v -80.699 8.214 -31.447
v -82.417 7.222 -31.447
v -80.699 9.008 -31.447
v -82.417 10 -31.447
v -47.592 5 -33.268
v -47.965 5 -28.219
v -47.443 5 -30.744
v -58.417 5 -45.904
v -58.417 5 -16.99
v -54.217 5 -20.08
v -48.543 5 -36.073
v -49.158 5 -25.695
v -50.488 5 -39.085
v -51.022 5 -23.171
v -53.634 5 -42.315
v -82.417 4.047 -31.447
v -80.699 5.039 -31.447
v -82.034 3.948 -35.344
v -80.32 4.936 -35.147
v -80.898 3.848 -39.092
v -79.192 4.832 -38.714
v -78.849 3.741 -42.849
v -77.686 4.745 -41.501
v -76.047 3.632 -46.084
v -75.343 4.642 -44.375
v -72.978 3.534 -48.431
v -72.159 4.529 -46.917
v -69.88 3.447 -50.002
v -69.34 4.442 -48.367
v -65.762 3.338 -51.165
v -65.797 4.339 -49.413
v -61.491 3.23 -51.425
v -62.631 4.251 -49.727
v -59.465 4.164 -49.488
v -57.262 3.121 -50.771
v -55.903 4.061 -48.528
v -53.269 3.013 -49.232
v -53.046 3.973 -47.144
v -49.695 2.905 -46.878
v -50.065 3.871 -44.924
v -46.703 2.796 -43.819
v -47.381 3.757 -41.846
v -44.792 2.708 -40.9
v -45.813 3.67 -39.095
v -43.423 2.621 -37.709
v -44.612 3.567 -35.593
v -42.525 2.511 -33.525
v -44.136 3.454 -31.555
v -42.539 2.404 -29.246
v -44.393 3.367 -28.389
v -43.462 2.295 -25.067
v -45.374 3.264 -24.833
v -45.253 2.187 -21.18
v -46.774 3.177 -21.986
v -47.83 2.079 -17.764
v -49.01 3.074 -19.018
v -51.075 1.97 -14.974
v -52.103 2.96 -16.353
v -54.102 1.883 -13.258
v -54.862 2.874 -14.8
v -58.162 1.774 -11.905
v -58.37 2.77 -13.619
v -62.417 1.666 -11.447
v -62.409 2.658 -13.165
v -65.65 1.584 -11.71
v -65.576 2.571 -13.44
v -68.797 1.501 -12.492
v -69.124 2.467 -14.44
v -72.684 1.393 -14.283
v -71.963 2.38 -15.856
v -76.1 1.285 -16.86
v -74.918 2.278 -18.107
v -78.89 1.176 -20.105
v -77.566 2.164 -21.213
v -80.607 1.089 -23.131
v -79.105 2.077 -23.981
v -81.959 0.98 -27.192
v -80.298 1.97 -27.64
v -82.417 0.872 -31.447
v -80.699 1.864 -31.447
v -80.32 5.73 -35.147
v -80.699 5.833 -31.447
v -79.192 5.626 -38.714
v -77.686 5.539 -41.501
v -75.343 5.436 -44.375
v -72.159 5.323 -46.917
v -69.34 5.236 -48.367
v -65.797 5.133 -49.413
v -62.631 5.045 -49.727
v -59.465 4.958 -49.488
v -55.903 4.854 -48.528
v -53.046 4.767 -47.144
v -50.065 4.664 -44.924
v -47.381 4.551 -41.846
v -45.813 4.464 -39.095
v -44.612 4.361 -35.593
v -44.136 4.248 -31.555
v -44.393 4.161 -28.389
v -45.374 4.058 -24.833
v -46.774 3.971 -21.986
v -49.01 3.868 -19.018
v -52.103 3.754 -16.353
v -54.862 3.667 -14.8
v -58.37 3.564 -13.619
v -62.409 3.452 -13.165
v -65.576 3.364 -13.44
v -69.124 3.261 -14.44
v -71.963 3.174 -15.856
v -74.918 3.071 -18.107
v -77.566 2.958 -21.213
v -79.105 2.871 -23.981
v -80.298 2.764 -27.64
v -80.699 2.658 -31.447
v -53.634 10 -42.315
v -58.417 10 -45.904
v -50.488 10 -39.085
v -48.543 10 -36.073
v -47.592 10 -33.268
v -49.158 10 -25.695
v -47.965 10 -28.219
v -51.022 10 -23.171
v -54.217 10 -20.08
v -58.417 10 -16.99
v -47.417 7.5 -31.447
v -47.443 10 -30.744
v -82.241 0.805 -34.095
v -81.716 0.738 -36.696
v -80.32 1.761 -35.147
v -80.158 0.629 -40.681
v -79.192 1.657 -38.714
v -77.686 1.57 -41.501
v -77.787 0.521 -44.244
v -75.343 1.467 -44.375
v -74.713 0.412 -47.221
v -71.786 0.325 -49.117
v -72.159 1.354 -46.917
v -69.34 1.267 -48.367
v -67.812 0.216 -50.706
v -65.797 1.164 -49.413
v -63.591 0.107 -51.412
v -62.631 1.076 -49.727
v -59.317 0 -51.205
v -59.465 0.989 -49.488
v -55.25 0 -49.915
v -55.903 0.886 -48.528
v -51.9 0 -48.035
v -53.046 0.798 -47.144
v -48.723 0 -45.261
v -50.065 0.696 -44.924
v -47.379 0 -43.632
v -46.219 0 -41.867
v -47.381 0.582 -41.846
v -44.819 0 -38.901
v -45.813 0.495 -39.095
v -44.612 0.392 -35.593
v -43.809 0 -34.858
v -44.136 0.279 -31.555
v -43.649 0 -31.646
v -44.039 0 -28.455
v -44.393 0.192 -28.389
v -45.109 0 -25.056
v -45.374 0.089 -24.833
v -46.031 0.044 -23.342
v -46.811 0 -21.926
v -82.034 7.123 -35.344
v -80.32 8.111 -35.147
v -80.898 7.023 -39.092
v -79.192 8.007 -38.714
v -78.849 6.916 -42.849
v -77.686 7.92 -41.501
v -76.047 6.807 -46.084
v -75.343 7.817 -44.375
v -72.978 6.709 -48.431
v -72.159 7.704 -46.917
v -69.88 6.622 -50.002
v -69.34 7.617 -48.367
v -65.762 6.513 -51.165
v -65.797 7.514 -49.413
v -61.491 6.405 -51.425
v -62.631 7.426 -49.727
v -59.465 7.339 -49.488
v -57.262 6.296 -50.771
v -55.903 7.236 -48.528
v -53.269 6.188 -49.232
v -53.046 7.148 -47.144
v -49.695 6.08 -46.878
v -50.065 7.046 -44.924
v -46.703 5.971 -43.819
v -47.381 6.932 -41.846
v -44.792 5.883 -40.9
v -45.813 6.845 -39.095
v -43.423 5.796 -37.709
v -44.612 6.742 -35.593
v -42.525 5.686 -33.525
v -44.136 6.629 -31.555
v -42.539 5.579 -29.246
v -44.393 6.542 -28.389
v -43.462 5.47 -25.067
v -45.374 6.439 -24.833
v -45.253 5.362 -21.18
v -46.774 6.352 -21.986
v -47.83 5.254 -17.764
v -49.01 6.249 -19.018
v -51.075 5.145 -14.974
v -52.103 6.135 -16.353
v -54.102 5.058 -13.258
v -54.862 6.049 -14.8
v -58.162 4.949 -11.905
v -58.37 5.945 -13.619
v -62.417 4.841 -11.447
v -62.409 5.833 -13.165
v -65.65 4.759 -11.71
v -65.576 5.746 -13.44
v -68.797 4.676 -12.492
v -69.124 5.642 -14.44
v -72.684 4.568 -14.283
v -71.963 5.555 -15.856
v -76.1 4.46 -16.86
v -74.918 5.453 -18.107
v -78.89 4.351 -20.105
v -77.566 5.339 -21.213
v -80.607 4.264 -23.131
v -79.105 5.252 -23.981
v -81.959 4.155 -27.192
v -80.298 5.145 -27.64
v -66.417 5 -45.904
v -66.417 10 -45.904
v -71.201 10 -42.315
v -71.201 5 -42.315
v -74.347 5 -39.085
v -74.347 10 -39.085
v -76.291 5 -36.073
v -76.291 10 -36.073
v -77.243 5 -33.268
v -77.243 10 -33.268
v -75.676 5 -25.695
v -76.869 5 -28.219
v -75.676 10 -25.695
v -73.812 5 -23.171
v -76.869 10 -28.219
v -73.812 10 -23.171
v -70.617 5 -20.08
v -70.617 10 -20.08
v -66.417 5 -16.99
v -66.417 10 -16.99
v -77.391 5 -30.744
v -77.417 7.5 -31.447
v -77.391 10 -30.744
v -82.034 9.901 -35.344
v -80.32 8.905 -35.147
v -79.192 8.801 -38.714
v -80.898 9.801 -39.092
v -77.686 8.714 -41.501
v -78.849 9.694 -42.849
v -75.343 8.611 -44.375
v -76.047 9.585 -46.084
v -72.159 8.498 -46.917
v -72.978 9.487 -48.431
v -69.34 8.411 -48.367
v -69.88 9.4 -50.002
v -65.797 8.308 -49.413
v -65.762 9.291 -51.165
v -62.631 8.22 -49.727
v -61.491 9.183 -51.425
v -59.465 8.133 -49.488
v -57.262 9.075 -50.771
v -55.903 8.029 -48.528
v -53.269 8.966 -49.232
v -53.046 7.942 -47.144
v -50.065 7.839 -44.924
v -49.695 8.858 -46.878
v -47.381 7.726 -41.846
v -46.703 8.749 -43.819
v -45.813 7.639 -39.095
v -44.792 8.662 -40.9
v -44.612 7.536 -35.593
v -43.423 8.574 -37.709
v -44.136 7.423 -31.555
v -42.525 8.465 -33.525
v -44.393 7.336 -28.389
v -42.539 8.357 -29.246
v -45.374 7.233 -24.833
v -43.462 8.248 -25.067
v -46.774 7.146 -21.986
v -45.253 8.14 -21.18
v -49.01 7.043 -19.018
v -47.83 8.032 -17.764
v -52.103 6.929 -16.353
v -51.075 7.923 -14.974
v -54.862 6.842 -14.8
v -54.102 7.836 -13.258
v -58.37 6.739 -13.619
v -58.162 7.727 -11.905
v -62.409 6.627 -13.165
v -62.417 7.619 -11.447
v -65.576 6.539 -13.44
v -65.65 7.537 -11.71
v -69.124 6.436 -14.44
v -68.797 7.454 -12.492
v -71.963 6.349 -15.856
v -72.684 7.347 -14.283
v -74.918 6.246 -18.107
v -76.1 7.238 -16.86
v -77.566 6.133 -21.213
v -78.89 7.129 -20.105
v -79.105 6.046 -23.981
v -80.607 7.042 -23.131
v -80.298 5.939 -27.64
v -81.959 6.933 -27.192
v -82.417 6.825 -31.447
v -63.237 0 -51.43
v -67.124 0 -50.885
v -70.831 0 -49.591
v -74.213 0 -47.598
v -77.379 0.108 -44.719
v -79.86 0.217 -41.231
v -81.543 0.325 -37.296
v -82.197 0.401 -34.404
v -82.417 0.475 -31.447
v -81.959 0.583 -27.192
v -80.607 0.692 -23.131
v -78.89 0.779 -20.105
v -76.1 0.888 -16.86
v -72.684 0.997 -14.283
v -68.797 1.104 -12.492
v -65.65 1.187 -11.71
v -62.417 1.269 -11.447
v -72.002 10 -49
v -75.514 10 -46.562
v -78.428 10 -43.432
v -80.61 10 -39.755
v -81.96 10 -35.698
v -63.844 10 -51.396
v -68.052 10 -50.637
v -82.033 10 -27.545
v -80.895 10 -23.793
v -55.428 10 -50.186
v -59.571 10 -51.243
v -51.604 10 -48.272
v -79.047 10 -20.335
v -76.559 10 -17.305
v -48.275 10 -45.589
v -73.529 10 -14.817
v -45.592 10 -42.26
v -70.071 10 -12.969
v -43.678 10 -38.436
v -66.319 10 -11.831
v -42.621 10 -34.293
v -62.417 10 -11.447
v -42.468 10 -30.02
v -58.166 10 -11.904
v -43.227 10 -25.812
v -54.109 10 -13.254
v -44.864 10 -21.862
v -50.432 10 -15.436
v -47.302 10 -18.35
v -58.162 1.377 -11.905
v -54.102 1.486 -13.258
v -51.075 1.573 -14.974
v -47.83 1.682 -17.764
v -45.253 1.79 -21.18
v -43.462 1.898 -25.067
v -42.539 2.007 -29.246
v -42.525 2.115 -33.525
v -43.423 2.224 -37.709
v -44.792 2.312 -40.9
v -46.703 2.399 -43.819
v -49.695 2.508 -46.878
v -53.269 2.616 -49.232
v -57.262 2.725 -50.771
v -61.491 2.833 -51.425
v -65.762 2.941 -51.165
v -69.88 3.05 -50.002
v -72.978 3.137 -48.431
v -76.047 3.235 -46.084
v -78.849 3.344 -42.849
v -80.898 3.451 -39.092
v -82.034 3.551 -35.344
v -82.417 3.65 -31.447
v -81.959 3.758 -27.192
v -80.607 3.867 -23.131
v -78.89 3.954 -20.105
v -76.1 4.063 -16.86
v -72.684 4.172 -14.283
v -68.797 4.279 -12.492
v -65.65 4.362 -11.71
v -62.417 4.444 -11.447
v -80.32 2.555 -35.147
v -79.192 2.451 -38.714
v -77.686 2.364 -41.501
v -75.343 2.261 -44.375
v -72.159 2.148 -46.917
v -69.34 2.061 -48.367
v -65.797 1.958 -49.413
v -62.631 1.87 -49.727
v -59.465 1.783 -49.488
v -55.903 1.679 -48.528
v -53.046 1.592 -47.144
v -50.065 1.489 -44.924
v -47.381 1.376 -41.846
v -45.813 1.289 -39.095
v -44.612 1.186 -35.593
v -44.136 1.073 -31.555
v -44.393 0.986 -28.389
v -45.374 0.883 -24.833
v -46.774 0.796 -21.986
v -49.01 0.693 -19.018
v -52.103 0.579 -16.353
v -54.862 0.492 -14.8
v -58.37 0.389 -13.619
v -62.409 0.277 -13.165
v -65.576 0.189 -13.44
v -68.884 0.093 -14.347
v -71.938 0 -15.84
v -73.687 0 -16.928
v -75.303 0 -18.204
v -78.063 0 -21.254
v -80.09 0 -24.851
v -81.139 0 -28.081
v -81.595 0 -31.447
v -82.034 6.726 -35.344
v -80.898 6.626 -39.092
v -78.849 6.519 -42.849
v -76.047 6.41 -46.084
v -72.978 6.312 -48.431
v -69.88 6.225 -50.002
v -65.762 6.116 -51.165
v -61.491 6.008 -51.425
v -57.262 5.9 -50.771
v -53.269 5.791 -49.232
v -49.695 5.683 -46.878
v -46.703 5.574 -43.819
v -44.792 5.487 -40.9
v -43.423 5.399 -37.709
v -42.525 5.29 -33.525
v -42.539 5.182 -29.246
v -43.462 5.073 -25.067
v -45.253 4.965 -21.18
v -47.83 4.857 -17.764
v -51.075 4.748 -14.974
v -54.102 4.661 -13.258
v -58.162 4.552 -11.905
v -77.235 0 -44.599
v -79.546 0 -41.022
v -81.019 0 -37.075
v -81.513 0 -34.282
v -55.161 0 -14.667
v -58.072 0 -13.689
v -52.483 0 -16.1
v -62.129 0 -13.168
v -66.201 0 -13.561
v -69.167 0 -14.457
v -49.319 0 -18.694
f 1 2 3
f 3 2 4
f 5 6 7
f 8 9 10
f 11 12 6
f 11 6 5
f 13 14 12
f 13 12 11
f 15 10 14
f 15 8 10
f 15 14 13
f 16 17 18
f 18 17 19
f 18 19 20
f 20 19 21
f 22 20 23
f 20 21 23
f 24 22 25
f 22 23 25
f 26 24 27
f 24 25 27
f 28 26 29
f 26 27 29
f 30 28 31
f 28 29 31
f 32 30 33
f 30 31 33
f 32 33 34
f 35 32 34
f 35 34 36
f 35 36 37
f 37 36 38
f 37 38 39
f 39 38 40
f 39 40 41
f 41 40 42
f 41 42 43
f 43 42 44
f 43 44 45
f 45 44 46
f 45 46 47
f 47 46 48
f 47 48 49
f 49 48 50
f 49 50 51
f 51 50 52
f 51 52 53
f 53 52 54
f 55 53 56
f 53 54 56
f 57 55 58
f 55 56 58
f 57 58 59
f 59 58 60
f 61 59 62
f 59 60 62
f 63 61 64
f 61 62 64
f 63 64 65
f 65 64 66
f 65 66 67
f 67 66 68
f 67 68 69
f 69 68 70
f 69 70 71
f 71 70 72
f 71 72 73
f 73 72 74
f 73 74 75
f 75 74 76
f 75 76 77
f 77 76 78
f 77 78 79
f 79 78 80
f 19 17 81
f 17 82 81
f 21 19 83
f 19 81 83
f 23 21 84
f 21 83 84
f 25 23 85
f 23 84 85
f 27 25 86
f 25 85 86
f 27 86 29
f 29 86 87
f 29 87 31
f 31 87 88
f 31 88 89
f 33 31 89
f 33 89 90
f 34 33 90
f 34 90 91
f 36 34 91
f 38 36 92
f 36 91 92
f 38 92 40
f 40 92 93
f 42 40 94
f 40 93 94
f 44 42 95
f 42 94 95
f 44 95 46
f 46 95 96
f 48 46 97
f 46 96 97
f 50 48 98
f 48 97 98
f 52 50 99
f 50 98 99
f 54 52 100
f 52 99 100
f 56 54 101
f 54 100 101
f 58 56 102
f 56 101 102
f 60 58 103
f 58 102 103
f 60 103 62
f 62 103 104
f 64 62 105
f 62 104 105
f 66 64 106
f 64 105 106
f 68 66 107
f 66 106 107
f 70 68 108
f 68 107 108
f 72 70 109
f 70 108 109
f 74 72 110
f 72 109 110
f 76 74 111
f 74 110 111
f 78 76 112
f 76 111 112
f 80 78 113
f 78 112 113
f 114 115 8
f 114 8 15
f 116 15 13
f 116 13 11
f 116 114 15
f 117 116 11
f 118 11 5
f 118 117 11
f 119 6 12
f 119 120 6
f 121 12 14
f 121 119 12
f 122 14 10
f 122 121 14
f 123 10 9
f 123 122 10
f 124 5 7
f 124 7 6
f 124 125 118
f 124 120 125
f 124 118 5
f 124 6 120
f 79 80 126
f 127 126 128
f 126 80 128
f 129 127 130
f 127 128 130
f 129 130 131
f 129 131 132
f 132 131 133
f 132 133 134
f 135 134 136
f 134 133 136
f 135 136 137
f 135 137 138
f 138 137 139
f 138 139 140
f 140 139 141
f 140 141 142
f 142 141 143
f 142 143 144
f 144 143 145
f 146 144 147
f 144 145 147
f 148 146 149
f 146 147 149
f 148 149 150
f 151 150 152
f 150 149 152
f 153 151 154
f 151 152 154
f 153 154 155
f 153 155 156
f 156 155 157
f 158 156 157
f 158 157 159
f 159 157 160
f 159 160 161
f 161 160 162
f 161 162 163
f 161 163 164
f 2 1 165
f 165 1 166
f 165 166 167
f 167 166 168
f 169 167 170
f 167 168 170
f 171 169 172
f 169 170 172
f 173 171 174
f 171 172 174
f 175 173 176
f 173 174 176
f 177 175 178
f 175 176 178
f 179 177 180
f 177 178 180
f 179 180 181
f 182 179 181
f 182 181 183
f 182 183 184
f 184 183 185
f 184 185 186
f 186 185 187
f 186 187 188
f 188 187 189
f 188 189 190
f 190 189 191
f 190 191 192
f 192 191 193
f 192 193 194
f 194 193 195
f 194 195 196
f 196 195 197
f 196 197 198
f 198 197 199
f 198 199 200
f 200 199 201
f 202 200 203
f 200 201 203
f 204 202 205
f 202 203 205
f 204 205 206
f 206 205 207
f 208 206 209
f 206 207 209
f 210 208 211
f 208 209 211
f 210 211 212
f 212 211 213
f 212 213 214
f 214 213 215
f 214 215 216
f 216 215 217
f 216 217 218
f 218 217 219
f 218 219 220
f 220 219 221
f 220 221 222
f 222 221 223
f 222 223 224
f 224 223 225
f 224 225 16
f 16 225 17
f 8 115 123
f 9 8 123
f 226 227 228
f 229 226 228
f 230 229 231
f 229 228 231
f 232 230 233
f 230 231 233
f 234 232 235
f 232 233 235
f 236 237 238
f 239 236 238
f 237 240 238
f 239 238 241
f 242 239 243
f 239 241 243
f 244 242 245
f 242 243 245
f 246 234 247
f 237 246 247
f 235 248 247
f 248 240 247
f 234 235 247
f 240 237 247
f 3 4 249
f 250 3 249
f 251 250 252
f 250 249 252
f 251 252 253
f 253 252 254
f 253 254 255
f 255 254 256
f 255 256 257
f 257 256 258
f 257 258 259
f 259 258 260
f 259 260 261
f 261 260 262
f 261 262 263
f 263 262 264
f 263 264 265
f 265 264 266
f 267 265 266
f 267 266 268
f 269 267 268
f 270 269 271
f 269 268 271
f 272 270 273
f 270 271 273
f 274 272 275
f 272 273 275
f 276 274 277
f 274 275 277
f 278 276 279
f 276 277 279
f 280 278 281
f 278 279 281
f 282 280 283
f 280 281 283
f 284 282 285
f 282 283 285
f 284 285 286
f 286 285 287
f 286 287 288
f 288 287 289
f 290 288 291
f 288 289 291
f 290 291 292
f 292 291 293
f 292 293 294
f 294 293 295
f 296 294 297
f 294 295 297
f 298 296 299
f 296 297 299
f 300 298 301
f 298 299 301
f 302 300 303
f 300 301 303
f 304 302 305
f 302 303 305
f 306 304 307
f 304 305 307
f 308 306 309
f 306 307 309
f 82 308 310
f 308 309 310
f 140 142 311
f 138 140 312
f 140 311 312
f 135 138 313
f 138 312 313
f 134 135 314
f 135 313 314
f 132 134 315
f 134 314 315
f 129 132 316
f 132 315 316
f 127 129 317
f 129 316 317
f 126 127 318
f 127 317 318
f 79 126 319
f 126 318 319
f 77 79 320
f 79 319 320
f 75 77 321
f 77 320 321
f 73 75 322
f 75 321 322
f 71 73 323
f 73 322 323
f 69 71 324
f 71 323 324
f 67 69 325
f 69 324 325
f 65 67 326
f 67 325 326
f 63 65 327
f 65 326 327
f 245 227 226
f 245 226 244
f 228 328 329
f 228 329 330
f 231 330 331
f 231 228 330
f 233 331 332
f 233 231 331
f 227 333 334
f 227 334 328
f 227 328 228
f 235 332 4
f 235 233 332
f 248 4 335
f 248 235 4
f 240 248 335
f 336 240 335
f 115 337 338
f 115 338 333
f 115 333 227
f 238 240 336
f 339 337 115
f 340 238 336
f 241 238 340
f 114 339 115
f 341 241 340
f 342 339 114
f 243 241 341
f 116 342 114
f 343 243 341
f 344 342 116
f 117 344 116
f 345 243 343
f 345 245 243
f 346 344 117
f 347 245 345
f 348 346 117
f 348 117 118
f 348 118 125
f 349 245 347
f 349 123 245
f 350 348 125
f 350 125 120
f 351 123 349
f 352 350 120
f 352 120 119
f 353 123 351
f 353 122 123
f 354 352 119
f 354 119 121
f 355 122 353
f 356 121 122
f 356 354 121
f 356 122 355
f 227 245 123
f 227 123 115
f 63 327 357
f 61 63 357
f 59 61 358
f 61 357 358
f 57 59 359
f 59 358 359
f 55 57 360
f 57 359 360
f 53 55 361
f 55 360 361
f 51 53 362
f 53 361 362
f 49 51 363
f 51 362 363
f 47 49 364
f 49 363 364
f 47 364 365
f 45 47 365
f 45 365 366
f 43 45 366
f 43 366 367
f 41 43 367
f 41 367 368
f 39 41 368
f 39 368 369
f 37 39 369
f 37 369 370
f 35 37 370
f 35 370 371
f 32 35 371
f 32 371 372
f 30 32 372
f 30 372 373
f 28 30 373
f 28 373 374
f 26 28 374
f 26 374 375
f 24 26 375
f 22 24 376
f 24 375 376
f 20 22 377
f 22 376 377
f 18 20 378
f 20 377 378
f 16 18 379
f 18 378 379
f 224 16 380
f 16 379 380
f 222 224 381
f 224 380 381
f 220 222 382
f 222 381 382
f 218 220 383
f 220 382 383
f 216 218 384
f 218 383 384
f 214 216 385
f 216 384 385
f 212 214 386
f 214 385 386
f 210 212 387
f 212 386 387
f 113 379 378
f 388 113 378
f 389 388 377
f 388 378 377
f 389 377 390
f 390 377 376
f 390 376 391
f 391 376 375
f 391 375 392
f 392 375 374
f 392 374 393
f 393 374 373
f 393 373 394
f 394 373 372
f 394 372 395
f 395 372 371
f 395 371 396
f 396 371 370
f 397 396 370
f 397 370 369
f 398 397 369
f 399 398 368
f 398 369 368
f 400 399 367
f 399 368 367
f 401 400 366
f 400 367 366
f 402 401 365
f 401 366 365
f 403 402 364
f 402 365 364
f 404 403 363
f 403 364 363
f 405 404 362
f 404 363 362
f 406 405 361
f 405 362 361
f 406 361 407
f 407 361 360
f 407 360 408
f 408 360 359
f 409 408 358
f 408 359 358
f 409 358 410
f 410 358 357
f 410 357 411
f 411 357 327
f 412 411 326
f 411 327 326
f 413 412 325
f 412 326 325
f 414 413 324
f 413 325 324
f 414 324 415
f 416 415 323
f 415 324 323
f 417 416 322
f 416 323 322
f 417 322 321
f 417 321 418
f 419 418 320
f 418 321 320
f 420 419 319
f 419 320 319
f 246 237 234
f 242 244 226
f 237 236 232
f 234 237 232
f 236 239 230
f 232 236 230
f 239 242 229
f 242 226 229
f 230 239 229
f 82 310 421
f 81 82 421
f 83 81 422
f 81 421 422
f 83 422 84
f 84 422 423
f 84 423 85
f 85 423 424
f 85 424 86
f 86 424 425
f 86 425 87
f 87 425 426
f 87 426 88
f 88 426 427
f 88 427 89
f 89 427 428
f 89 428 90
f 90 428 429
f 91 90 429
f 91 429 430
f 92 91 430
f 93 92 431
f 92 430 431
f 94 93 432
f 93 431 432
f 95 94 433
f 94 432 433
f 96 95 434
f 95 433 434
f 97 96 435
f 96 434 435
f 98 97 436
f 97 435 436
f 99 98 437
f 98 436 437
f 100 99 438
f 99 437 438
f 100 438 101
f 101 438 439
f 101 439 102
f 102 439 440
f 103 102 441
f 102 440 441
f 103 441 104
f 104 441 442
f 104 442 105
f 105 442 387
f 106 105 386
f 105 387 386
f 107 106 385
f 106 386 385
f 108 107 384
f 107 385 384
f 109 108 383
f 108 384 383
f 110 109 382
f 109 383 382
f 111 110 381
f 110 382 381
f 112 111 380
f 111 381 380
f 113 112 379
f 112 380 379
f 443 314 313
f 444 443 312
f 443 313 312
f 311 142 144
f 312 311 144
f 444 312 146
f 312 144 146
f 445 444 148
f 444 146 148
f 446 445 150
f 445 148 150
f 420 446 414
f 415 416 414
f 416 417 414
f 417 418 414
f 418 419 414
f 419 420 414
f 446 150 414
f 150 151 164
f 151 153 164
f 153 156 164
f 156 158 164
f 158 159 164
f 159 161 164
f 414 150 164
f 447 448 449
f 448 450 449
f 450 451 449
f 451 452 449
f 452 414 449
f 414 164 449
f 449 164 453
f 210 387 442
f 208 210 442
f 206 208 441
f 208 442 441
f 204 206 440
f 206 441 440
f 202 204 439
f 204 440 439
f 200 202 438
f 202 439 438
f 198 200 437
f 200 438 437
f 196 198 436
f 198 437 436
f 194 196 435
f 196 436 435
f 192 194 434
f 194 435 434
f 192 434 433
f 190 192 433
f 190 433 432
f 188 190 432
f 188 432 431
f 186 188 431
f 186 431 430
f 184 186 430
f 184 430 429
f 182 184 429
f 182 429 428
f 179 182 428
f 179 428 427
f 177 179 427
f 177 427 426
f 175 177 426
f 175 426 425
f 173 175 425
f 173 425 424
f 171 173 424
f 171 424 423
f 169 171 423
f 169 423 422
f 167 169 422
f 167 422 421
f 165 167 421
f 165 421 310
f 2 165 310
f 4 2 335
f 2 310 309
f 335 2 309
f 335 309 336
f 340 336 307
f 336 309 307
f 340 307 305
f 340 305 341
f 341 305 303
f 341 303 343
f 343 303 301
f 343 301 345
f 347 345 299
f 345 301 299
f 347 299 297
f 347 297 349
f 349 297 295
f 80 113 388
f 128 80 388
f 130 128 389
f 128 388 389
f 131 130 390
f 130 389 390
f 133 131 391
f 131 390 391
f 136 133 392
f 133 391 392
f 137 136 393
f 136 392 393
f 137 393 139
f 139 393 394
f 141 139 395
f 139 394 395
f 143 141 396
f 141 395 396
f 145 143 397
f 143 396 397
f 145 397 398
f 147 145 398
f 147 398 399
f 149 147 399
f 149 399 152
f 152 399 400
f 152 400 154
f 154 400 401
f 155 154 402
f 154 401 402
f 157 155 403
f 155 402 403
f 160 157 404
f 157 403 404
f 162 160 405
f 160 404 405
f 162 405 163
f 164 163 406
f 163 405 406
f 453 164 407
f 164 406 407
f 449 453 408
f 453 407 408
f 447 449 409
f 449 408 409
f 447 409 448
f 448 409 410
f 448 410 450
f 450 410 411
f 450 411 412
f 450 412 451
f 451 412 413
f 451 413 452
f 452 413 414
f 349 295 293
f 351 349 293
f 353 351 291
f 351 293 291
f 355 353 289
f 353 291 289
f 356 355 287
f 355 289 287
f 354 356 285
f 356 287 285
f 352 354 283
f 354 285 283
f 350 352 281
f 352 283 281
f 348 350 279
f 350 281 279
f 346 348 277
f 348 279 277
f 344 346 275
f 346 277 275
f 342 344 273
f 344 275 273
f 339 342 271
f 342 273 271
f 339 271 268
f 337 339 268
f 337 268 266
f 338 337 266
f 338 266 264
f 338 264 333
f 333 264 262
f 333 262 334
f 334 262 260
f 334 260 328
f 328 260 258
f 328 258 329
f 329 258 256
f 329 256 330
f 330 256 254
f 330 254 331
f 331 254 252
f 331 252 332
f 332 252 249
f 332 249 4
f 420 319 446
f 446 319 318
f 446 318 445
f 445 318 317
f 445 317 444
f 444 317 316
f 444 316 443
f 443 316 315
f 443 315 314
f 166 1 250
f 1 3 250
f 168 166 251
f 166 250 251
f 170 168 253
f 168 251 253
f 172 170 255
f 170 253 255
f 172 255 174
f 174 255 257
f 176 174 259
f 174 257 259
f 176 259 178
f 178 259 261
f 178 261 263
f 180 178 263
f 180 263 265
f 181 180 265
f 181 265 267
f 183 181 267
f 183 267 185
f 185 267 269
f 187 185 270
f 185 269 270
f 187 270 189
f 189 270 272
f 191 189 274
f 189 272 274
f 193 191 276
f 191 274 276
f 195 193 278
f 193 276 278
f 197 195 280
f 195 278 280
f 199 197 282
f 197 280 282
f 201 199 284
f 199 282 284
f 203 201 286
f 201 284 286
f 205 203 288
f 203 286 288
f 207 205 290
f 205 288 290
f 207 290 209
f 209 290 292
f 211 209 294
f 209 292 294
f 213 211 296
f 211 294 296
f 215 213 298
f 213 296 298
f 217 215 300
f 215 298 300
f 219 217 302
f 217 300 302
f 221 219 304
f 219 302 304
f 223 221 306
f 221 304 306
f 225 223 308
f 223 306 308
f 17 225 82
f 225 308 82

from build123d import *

# Parameters (mm, degrees)
SKETCH1_R           = 20
BOSS_EXTRUDE1_DEPTH = 10
THREAD1_PITCH       = 3.175
CUT_EXTRUDE2_DEPTH  = 5


with BuildPart() as part:
    # Sketch1 → Boss-Extrude1 (new body)
    with BuildSketch(Plane(origin=(0, 0, 0), x_dir=(1, 0, 0), z_dir=(0, 1, 0))):
        with Locations(Location((-62.417227704, 31.446847546, 0), (0, 0, 270))):
            Circle(SKETCH1_R)
    extrude(amount=BOSS_EXTRUDE1_DEPTH)

    # Thread1: the profile of Thread Profile1 profile screwed along a right-hand helix of 3.149606 turns, 12 arcs to a turn; built about Z, then put on its axis
    thread1_z = Axis((0, 0, 0), (0, 0, 1))
    thread1_corners = [(20.0003, 0, -0.000173205), (20.0003, 0, 2.778298196), (18.281480847, 0, 1.785937496), (18.281480847, 0, 0.992187496)]
    with BuildLine(mode=Mode.PRIVATE) as thread1_profile:
        Line(thread1_corners[0], thread1_corners[1])
        Line(thread1_corners[1], thread1_corners[2])
        Line(thread1_corners[2], thread1_corners[3])
        Line(thread1_corners[3], thread1_corners[0])
    thread1_cap = Face(thread1_profile.wire())
    thread1_turn_angles = [0, 15, 30, 45, 60, 75, 90, 105, 120, 135, 150, 165, 180, 195, 210, 225, 240, 255, 270, 285, 300, 315, 330, 345, 360]
    thread1_turn_weights = [1, 0.9659258262890683, 1, 0.9659258262890683, 1, 0.9659258262890683, 1, 0.9659258262890683, 1, 0.9659258262890683, 1, 0.9659258262890683, 1, 0.9659258262890683, 1, 0.9659258262890683, 1, 0.9659258262890683, 1, 0.9659258262890683, 1, 0.9659258262890683, 1, 0.9659258262890683, 1]
    thread1_turn_rails = [Edge.make_bspline([Vector(p[0], p[1], 0).rotate(thread1_z, thread1_turn_angles[k]) / thread1_turn_weights[k] + Vector(0, 0, p[2] + THREAD1_PITCH * thread1_turn_angles[k] / 360) for k in range(25)], [0, 0, 0, 1, 1, 2, 2, 3, 3, 4, 4, 5, 5, 6, 6, 7, 7, 8, 8, 9, 9, 10, 10, 11, 11, 12, 12, 12], 2, thread1_turn_weights) for p in thread1_corners]
    thread1_turn_sides = [Face.make_surface_from_curves(thread1_turn_rails[p[0]], thread1_turn_rails[p[1]]) for p in [(0, 1), (1, 2), (2, 3), (3, 0)]]
    thread1_last_angles = [1080, 1095, 1110, 1121.929133858, 1133.858267717]
    thread1_last_weights = [1, 0.9659258262890683, 1, 0.9784040075425771, 1]
    thread1_last_rails = [Edge.make_bspline([Vector(p[0], p[1], 0).rotate(thread1_z, thread1_last_angles[k]) / thread1_last_weights[k] + Vector(0, 0, p[2] + THREAD1_PITCH * thread1_last_angles[k] / 360) for k in range(5)], [0, 0, 0, 1, 1, 2, 2, 2], 2, thread1_last_weights) for p in thread1_corners]
    thread1_last_sides = [Face.make_surface_from_curves(thread1_last_rails[p[0]], thread1_last_rails[p[1]]) for p in [(0, 1), (1, 2), (2, 3), (3, 0)]]
    thread1 = Plane(origin=(-62.417227704, 10, -31.446847546), x_dir=(-1, 0, 0), z_dir=(0, -1, 0)) * Solid(Shell([*[p.moved(Location((0, 0, THREAD1_PITCH * i))) for i in range(3) for p in thread1_turn_sides], *thread1_last_sides, thread1_cap, thread1_cap.rotate(thread1_z, 1133.858267717).moved(Location((0, 0, THREAD1_PITCH * 1133.858267717 / 360)))]))
    add(thread1, mode=Mode.SUBTRACT)

    # Sketch9 → Cut-Extrude2 (cut)
    with BuildSketch(Plane(origin=(0, 10, 0), x_dir=(1, 0, 0), z_dir=(0, 1, 0))):
        with BuildLine():
            Line((-66.417227704, 45.90367984), (-66.417227704, 31.446847546))
            Line((-66.417227704, 31.446847546), (-66.417227704, 16.990015251))
            add(Edge.make_bspline(
                [(-66.417227704, 45.90367984), (-88.417227704, 31.446847546), (-66.417227704, 16.990015251)],
                knots=[0, 0, 0, 1, 1, 1], degree=2))
        make_face()
        with BuildLine():
            Line((-58.417227704, 45.90367984), (-58.417227704, 16.990015251))
            add(Edge.make_bspline(
                [(-58.417227704, 45.90367984), (-36.417227704, 31.446847546), (-58.417227704, 16.990015251)],
                knots=[0, 0, 0, 1, 1, 1], degree=2))
        make_face()
    extrude(amount=-CUT_EXTRUDE2_DEPTH, mode=Mode.SUBTRACT)


solid = part.part
